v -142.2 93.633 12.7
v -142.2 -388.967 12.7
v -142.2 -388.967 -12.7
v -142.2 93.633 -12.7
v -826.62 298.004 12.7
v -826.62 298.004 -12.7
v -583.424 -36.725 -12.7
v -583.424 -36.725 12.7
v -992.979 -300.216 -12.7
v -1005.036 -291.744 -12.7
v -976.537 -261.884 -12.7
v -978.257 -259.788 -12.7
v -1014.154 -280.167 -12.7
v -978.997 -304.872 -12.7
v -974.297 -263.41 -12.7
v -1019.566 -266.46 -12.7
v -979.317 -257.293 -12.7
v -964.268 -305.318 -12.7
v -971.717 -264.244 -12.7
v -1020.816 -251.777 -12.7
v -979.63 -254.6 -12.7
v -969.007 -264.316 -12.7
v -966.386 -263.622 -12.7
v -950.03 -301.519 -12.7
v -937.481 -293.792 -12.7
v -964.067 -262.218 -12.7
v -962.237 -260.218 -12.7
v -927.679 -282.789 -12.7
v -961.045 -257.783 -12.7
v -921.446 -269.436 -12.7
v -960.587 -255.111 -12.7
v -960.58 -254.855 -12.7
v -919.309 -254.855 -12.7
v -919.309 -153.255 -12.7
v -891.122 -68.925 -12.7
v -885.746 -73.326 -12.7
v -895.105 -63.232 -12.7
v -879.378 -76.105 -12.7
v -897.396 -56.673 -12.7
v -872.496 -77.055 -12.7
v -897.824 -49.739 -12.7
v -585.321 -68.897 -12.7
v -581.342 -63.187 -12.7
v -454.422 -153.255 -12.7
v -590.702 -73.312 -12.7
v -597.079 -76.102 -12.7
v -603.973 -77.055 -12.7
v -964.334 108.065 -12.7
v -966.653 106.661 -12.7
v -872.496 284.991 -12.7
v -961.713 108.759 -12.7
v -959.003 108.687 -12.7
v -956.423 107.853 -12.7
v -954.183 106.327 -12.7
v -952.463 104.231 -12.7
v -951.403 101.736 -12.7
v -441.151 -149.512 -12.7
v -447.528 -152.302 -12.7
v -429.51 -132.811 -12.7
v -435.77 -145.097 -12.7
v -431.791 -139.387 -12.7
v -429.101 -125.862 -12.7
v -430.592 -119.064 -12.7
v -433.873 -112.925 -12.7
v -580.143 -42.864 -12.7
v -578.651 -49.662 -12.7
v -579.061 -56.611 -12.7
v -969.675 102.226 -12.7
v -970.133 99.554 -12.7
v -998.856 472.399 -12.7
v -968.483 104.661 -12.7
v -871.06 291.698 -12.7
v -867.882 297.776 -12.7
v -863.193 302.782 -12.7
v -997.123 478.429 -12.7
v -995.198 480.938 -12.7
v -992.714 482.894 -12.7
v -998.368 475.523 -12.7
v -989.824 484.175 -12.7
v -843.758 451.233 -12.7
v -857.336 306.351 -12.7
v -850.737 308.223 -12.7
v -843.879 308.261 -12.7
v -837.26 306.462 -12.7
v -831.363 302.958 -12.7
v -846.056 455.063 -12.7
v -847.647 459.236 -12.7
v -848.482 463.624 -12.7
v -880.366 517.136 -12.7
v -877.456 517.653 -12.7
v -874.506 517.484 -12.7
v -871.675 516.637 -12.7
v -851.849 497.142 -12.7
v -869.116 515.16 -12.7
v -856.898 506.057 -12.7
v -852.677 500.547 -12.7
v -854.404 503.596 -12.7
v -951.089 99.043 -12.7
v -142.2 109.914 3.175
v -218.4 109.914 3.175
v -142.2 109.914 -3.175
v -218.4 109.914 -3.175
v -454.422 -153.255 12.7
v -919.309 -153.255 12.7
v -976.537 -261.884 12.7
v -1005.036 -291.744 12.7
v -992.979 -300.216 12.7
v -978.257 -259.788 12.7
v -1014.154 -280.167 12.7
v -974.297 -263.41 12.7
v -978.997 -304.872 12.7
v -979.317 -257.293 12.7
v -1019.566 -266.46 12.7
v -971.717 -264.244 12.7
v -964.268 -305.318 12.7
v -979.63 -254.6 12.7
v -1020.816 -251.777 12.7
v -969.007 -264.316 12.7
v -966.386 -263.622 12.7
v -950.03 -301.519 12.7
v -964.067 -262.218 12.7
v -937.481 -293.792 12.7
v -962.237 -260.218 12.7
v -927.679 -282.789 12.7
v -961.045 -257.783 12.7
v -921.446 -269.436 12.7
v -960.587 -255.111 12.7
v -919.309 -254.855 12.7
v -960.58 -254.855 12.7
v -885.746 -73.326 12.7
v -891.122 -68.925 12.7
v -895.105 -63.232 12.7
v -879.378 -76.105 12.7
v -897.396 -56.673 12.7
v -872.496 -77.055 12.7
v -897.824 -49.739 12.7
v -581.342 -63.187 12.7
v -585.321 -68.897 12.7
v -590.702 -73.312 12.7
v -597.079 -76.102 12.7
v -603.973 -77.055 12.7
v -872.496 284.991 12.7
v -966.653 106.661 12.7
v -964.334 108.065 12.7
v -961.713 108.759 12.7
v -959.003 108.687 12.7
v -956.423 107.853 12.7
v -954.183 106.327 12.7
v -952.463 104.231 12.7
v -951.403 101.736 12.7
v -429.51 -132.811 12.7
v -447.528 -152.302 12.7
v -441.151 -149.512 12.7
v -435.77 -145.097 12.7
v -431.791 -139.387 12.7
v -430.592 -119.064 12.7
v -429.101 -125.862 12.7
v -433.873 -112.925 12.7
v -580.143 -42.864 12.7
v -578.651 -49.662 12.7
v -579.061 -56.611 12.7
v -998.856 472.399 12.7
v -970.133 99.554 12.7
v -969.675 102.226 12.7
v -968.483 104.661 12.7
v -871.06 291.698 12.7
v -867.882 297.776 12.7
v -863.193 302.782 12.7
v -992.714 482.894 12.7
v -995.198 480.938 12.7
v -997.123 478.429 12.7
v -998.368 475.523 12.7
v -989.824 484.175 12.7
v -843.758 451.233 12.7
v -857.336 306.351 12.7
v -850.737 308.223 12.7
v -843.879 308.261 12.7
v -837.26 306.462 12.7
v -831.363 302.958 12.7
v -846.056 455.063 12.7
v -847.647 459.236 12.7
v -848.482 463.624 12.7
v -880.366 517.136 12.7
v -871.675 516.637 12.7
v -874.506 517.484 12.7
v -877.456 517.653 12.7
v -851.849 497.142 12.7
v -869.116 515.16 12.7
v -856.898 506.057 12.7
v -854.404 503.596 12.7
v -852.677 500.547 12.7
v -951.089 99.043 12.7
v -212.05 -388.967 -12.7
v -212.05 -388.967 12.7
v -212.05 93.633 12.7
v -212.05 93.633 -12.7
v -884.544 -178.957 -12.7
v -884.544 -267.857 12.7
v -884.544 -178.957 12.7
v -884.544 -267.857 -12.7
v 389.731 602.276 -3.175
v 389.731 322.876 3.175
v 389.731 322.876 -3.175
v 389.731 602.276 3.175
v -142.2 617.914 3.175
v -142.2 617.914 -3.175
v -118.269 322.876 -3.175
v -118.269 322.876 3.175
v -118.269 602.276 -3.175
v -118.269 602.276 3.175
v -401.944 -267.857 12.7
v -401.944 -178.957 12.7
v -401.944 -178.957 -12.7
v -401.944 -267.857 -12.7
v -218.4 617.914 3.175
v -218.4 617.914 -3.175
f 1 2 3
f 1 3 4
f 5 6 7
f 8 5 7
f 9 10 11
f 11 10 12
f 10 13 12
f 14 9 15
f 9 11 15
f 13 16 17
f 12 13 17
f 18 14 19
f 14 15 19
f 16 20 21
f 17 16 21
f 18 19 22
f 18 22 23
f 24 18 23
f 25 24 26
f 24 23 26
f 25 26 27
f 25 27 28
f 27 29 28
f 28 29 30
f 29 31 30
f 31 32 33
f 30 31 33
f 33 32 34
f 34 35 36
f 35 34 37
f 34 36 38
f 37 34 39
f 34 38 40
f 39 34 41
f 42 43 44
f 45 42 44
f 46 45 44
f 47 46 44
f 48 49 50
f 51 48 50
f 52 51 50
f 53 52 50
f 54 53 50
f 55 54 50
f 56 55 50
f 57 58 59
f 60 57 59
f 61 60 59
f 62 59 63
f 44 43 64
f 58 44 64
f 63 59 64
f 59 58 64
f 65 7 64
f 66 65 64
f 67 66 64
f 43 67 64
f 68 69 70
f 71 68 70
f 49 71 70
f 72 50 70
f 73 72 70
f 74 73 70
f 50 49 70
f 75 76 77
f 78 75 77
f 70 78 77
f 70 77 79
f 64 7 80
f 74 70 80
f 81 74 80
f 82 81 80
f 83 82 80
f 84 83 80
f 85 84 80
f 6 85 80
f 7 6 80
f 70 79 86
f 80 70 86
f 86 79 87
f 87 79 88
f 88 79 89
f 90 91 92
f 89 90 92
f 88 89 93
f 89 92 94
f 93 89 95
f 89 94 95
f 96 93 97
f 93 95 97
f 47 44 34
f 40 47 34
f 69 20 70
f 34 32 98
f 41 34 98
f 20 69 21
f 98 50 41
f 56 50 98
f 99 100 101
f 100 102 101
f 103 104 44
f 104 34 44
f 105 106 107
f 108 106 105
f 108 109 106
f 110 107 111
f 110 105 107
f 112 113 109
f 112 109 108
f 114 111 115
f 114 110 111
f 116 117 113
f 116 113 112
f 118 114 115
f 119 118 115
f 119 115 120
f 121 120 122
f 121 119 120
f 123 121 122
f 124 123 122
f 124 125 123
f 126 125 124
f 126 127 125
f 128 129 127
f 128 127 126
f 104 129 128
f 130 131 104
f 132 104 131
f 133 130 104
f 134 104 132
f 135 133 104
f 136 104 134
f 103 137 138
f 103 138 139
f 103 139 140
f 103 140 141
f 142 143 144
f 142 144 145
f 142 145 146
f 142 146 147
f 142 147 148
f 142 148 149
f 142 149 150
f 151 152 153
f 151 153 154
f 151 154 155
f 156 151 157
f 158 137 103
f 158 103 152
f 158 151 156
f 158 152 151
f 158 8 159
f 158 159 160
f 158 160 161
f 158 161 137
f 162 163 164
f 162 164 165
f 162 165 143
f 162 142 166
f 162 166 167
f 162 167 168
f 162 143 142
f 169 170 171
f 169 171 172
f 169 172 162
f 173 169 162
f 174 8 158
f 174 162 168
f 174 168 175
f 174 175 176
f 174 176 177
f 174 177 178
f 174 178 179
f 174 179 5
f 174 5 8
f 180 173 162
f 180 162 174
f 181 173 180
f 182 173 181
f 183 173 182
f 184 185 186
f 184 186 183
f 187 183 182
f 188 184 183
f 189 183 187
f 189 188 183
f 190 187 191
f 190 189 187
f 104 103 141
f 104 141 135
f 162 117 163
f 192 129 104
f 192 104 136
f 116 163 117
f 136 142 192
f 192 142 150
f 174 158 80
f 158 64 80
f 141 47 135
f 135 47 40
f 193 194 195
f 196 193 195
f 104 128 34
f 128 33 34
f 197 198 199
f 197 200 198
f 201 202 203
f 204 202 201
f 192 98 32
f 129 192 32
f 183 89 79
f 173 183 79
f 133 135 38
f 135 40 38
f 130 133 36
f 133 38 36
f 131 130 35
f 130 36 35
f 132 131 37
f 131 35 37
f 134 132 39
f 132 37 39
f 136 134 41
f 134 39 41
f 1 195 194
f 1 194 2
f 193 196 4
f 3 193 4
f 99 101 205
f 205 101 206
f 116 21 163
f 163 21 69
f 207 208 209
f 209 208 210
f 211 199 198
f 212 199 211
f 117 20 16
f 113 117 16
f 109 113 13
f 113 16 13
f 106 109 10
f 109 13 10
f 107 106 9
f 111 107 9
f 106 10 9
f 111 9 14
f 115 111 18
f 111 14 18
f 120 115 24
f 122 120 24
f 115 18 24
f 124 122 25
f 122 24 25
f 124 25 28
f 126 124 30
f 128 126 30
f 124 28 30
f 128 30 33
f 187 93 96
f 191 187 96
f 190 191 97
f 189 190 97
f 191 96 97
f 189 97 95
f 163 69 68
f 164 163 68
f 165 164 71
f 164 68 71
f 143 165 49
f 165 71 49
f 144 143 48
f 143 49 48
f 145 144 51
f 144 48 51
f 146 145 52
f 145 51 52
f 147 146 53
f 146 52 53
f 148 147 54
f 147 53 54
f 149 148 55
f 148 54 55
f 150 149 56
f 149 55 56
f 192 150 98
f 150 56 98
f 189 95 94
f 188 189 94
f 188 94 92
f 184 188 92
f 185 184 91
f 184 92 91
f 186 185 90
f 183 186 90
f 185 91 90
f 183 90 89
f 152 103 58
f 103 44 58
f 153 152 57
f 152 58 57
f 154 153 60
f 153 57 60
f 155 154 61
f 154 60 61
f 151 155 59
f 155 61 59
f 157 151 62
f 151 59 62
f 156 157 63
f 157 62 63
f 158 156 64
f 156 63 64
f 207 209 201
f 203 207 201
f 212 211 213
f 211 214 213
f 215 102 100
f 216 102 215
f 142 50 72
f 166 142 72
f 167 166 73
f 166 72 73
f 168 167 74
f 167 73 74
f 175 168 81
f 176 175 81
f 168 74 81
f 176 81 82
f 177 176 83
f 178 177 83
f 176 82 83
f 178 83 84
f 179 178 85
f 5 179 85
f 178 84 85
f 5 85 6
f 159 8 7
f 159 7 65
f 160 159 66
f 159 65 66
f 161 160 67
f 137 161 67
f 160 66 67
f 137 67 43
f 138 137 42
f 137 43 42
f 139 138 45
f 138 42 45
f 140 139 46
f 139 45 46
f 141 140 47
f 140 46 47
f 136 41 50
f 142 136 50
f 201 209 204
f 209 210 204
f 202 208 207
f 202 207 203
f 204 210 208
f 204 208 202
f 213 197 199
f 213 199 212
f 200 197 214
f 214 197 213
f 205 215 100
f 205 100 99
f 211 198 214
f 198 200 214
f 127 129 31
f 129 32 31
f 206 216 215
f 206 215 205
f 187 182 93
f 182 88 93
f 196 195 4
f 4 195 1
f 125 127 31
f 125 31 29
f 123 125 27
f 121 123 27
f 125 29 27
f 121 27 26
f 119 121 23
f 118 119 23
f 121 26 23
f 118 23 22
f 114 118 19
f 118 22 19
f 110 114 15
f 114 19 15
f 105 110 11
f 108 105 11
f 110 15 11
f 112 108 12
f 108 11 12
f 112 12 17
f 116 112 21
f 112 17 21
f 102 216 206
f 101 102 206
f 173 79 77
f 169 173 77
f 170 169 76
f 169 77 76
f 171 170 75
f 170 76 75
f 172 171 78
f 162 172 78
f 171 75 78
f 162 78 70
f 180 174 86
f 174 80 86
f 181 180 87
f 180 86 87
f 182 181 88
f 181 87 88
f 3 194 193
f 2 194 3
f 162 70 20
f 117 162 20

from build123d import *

# Parameters (mm, degrees)
F0_W     = 482.6
F0_H     = 88.9
F0_W_2   = 69.85
F0_H_2   = 482.6
F1_DEPTH = 12.7
F0_W_3   = 76.2
F0_H_3   = 508
F0_W_4   = 508
F0_H_4   = 279.4
F2_DEPTH = 3.175


with BuildPart() as f1:
    # F0 (on Top) → F1 (new body, symmetric)
    with BuildSketch(Plane.XY):
        with Locations((-643.243538, -223.406658)):
            Rectangle(F0_W, F0_H)
        with BuildLine():
            ThreePointArc((-1020.815531, -251.777208), (-971.648586, -305.631893), (-919.308867, -254.855233))
            Line((-919.308867, -254.855233), (-919.308867, -153.255233))
            Line((-919.308867, -153.255233), (-454.422219, -153.255233))
            ThreePointArc((-454.422219, -153.255233), (-431.790654, -139.386591), (-433.873188, -112.925487))
            Line((-433.873188, -112.925487), (-843.758204, 451.232839))
            ThreePointArc((-843.758204, 451.232839), (-846.942959, 457.114525), (-848.481958, 463.623625))
            Line((-848.481958, 463.623625), (-851.849275, 497.141894))
            ThreePointArc((-851.849275, 497.141894), (-853.434831, 502.130929), (-856.898014, 506.056593))
            Line((-856.898014, 506.056593), (-869.116037, 515.159549))
            ThreePointArc((-869.116037, 515.159549), (-874.506086, 517.483789), (-880.365587, 517.135984))
            Line((-880.365587, 517.135984), (-989.823782, 484.175108))
            ThreePointArc((-989.823782, 484.175108), (-996.238933, 479.743863), (-998.856052, 472.399424))
            Line((-998.856052, 472.399424), (-1020.815531, -251.777208))
        make_face()
        with BuildLine():
            Line((-960.580442, -254.855233), (-960.58729, -255.110588))
            ThreePointArc((-960.58729, -255.110588), (-970.364222, -264.376809), (-979.630443, -254.599877))
            Line((-979.630443, -254.599877), (-970.132543, 99.553558))
            ThreePointArc((-970.132543, 99.553558), (-960.355612, 108.819779), (-951.08939, 99.042848))
            Line((-951.08939, 99.042848), (-960.580442, -254.855233))
        make_face(mode=Mode.SUBTRACT)
        with BuildLine():
            ThreePointArc((-872.496188, -77.055233), (-891.121941, -68.924897), (-897.823787, -49.738799))
            Line((-897.823787, -49.738799), (-872.496188, 284.991019))
            ThreePointArc((-872.496188, 284.991019), (-854.100057, 307.510518), (-826.619557, 298.004332))
            Line((-826.619557, 298.004332), (-583.424108, -36.725487))
            ThreePointArc((-583.424108, -36.725487), (-581.341574, -63.186591), (-603.97314, -77.055233))
            Line((-603.97314, -77.055233), (-872.496188, -77.055233))
        make_face(mode=Mode.SUBTRACT)
        with Locations((-177.125344, -147.66659)):
            Rectangle(F0_W_2, F0_H_2)
    extrude(amount=F1_DEPTH, both=True)


with BuildPart() as f2:
    # F0 (on Top) → F2 (new body, symmetric)
    with BuildSketch(Plane.XY):
        with Locations((-180.300344, 363.914206)):
            Rectangle(F0_W_3, F0_H_3)
        with Locations((135.730996, 462.576334)):
            Rectangle(F0_W_4, F0_H_4)
    extrude(amount=F2_DEPTH, both=True)


solid = Compound([f1.part, f2.part])
